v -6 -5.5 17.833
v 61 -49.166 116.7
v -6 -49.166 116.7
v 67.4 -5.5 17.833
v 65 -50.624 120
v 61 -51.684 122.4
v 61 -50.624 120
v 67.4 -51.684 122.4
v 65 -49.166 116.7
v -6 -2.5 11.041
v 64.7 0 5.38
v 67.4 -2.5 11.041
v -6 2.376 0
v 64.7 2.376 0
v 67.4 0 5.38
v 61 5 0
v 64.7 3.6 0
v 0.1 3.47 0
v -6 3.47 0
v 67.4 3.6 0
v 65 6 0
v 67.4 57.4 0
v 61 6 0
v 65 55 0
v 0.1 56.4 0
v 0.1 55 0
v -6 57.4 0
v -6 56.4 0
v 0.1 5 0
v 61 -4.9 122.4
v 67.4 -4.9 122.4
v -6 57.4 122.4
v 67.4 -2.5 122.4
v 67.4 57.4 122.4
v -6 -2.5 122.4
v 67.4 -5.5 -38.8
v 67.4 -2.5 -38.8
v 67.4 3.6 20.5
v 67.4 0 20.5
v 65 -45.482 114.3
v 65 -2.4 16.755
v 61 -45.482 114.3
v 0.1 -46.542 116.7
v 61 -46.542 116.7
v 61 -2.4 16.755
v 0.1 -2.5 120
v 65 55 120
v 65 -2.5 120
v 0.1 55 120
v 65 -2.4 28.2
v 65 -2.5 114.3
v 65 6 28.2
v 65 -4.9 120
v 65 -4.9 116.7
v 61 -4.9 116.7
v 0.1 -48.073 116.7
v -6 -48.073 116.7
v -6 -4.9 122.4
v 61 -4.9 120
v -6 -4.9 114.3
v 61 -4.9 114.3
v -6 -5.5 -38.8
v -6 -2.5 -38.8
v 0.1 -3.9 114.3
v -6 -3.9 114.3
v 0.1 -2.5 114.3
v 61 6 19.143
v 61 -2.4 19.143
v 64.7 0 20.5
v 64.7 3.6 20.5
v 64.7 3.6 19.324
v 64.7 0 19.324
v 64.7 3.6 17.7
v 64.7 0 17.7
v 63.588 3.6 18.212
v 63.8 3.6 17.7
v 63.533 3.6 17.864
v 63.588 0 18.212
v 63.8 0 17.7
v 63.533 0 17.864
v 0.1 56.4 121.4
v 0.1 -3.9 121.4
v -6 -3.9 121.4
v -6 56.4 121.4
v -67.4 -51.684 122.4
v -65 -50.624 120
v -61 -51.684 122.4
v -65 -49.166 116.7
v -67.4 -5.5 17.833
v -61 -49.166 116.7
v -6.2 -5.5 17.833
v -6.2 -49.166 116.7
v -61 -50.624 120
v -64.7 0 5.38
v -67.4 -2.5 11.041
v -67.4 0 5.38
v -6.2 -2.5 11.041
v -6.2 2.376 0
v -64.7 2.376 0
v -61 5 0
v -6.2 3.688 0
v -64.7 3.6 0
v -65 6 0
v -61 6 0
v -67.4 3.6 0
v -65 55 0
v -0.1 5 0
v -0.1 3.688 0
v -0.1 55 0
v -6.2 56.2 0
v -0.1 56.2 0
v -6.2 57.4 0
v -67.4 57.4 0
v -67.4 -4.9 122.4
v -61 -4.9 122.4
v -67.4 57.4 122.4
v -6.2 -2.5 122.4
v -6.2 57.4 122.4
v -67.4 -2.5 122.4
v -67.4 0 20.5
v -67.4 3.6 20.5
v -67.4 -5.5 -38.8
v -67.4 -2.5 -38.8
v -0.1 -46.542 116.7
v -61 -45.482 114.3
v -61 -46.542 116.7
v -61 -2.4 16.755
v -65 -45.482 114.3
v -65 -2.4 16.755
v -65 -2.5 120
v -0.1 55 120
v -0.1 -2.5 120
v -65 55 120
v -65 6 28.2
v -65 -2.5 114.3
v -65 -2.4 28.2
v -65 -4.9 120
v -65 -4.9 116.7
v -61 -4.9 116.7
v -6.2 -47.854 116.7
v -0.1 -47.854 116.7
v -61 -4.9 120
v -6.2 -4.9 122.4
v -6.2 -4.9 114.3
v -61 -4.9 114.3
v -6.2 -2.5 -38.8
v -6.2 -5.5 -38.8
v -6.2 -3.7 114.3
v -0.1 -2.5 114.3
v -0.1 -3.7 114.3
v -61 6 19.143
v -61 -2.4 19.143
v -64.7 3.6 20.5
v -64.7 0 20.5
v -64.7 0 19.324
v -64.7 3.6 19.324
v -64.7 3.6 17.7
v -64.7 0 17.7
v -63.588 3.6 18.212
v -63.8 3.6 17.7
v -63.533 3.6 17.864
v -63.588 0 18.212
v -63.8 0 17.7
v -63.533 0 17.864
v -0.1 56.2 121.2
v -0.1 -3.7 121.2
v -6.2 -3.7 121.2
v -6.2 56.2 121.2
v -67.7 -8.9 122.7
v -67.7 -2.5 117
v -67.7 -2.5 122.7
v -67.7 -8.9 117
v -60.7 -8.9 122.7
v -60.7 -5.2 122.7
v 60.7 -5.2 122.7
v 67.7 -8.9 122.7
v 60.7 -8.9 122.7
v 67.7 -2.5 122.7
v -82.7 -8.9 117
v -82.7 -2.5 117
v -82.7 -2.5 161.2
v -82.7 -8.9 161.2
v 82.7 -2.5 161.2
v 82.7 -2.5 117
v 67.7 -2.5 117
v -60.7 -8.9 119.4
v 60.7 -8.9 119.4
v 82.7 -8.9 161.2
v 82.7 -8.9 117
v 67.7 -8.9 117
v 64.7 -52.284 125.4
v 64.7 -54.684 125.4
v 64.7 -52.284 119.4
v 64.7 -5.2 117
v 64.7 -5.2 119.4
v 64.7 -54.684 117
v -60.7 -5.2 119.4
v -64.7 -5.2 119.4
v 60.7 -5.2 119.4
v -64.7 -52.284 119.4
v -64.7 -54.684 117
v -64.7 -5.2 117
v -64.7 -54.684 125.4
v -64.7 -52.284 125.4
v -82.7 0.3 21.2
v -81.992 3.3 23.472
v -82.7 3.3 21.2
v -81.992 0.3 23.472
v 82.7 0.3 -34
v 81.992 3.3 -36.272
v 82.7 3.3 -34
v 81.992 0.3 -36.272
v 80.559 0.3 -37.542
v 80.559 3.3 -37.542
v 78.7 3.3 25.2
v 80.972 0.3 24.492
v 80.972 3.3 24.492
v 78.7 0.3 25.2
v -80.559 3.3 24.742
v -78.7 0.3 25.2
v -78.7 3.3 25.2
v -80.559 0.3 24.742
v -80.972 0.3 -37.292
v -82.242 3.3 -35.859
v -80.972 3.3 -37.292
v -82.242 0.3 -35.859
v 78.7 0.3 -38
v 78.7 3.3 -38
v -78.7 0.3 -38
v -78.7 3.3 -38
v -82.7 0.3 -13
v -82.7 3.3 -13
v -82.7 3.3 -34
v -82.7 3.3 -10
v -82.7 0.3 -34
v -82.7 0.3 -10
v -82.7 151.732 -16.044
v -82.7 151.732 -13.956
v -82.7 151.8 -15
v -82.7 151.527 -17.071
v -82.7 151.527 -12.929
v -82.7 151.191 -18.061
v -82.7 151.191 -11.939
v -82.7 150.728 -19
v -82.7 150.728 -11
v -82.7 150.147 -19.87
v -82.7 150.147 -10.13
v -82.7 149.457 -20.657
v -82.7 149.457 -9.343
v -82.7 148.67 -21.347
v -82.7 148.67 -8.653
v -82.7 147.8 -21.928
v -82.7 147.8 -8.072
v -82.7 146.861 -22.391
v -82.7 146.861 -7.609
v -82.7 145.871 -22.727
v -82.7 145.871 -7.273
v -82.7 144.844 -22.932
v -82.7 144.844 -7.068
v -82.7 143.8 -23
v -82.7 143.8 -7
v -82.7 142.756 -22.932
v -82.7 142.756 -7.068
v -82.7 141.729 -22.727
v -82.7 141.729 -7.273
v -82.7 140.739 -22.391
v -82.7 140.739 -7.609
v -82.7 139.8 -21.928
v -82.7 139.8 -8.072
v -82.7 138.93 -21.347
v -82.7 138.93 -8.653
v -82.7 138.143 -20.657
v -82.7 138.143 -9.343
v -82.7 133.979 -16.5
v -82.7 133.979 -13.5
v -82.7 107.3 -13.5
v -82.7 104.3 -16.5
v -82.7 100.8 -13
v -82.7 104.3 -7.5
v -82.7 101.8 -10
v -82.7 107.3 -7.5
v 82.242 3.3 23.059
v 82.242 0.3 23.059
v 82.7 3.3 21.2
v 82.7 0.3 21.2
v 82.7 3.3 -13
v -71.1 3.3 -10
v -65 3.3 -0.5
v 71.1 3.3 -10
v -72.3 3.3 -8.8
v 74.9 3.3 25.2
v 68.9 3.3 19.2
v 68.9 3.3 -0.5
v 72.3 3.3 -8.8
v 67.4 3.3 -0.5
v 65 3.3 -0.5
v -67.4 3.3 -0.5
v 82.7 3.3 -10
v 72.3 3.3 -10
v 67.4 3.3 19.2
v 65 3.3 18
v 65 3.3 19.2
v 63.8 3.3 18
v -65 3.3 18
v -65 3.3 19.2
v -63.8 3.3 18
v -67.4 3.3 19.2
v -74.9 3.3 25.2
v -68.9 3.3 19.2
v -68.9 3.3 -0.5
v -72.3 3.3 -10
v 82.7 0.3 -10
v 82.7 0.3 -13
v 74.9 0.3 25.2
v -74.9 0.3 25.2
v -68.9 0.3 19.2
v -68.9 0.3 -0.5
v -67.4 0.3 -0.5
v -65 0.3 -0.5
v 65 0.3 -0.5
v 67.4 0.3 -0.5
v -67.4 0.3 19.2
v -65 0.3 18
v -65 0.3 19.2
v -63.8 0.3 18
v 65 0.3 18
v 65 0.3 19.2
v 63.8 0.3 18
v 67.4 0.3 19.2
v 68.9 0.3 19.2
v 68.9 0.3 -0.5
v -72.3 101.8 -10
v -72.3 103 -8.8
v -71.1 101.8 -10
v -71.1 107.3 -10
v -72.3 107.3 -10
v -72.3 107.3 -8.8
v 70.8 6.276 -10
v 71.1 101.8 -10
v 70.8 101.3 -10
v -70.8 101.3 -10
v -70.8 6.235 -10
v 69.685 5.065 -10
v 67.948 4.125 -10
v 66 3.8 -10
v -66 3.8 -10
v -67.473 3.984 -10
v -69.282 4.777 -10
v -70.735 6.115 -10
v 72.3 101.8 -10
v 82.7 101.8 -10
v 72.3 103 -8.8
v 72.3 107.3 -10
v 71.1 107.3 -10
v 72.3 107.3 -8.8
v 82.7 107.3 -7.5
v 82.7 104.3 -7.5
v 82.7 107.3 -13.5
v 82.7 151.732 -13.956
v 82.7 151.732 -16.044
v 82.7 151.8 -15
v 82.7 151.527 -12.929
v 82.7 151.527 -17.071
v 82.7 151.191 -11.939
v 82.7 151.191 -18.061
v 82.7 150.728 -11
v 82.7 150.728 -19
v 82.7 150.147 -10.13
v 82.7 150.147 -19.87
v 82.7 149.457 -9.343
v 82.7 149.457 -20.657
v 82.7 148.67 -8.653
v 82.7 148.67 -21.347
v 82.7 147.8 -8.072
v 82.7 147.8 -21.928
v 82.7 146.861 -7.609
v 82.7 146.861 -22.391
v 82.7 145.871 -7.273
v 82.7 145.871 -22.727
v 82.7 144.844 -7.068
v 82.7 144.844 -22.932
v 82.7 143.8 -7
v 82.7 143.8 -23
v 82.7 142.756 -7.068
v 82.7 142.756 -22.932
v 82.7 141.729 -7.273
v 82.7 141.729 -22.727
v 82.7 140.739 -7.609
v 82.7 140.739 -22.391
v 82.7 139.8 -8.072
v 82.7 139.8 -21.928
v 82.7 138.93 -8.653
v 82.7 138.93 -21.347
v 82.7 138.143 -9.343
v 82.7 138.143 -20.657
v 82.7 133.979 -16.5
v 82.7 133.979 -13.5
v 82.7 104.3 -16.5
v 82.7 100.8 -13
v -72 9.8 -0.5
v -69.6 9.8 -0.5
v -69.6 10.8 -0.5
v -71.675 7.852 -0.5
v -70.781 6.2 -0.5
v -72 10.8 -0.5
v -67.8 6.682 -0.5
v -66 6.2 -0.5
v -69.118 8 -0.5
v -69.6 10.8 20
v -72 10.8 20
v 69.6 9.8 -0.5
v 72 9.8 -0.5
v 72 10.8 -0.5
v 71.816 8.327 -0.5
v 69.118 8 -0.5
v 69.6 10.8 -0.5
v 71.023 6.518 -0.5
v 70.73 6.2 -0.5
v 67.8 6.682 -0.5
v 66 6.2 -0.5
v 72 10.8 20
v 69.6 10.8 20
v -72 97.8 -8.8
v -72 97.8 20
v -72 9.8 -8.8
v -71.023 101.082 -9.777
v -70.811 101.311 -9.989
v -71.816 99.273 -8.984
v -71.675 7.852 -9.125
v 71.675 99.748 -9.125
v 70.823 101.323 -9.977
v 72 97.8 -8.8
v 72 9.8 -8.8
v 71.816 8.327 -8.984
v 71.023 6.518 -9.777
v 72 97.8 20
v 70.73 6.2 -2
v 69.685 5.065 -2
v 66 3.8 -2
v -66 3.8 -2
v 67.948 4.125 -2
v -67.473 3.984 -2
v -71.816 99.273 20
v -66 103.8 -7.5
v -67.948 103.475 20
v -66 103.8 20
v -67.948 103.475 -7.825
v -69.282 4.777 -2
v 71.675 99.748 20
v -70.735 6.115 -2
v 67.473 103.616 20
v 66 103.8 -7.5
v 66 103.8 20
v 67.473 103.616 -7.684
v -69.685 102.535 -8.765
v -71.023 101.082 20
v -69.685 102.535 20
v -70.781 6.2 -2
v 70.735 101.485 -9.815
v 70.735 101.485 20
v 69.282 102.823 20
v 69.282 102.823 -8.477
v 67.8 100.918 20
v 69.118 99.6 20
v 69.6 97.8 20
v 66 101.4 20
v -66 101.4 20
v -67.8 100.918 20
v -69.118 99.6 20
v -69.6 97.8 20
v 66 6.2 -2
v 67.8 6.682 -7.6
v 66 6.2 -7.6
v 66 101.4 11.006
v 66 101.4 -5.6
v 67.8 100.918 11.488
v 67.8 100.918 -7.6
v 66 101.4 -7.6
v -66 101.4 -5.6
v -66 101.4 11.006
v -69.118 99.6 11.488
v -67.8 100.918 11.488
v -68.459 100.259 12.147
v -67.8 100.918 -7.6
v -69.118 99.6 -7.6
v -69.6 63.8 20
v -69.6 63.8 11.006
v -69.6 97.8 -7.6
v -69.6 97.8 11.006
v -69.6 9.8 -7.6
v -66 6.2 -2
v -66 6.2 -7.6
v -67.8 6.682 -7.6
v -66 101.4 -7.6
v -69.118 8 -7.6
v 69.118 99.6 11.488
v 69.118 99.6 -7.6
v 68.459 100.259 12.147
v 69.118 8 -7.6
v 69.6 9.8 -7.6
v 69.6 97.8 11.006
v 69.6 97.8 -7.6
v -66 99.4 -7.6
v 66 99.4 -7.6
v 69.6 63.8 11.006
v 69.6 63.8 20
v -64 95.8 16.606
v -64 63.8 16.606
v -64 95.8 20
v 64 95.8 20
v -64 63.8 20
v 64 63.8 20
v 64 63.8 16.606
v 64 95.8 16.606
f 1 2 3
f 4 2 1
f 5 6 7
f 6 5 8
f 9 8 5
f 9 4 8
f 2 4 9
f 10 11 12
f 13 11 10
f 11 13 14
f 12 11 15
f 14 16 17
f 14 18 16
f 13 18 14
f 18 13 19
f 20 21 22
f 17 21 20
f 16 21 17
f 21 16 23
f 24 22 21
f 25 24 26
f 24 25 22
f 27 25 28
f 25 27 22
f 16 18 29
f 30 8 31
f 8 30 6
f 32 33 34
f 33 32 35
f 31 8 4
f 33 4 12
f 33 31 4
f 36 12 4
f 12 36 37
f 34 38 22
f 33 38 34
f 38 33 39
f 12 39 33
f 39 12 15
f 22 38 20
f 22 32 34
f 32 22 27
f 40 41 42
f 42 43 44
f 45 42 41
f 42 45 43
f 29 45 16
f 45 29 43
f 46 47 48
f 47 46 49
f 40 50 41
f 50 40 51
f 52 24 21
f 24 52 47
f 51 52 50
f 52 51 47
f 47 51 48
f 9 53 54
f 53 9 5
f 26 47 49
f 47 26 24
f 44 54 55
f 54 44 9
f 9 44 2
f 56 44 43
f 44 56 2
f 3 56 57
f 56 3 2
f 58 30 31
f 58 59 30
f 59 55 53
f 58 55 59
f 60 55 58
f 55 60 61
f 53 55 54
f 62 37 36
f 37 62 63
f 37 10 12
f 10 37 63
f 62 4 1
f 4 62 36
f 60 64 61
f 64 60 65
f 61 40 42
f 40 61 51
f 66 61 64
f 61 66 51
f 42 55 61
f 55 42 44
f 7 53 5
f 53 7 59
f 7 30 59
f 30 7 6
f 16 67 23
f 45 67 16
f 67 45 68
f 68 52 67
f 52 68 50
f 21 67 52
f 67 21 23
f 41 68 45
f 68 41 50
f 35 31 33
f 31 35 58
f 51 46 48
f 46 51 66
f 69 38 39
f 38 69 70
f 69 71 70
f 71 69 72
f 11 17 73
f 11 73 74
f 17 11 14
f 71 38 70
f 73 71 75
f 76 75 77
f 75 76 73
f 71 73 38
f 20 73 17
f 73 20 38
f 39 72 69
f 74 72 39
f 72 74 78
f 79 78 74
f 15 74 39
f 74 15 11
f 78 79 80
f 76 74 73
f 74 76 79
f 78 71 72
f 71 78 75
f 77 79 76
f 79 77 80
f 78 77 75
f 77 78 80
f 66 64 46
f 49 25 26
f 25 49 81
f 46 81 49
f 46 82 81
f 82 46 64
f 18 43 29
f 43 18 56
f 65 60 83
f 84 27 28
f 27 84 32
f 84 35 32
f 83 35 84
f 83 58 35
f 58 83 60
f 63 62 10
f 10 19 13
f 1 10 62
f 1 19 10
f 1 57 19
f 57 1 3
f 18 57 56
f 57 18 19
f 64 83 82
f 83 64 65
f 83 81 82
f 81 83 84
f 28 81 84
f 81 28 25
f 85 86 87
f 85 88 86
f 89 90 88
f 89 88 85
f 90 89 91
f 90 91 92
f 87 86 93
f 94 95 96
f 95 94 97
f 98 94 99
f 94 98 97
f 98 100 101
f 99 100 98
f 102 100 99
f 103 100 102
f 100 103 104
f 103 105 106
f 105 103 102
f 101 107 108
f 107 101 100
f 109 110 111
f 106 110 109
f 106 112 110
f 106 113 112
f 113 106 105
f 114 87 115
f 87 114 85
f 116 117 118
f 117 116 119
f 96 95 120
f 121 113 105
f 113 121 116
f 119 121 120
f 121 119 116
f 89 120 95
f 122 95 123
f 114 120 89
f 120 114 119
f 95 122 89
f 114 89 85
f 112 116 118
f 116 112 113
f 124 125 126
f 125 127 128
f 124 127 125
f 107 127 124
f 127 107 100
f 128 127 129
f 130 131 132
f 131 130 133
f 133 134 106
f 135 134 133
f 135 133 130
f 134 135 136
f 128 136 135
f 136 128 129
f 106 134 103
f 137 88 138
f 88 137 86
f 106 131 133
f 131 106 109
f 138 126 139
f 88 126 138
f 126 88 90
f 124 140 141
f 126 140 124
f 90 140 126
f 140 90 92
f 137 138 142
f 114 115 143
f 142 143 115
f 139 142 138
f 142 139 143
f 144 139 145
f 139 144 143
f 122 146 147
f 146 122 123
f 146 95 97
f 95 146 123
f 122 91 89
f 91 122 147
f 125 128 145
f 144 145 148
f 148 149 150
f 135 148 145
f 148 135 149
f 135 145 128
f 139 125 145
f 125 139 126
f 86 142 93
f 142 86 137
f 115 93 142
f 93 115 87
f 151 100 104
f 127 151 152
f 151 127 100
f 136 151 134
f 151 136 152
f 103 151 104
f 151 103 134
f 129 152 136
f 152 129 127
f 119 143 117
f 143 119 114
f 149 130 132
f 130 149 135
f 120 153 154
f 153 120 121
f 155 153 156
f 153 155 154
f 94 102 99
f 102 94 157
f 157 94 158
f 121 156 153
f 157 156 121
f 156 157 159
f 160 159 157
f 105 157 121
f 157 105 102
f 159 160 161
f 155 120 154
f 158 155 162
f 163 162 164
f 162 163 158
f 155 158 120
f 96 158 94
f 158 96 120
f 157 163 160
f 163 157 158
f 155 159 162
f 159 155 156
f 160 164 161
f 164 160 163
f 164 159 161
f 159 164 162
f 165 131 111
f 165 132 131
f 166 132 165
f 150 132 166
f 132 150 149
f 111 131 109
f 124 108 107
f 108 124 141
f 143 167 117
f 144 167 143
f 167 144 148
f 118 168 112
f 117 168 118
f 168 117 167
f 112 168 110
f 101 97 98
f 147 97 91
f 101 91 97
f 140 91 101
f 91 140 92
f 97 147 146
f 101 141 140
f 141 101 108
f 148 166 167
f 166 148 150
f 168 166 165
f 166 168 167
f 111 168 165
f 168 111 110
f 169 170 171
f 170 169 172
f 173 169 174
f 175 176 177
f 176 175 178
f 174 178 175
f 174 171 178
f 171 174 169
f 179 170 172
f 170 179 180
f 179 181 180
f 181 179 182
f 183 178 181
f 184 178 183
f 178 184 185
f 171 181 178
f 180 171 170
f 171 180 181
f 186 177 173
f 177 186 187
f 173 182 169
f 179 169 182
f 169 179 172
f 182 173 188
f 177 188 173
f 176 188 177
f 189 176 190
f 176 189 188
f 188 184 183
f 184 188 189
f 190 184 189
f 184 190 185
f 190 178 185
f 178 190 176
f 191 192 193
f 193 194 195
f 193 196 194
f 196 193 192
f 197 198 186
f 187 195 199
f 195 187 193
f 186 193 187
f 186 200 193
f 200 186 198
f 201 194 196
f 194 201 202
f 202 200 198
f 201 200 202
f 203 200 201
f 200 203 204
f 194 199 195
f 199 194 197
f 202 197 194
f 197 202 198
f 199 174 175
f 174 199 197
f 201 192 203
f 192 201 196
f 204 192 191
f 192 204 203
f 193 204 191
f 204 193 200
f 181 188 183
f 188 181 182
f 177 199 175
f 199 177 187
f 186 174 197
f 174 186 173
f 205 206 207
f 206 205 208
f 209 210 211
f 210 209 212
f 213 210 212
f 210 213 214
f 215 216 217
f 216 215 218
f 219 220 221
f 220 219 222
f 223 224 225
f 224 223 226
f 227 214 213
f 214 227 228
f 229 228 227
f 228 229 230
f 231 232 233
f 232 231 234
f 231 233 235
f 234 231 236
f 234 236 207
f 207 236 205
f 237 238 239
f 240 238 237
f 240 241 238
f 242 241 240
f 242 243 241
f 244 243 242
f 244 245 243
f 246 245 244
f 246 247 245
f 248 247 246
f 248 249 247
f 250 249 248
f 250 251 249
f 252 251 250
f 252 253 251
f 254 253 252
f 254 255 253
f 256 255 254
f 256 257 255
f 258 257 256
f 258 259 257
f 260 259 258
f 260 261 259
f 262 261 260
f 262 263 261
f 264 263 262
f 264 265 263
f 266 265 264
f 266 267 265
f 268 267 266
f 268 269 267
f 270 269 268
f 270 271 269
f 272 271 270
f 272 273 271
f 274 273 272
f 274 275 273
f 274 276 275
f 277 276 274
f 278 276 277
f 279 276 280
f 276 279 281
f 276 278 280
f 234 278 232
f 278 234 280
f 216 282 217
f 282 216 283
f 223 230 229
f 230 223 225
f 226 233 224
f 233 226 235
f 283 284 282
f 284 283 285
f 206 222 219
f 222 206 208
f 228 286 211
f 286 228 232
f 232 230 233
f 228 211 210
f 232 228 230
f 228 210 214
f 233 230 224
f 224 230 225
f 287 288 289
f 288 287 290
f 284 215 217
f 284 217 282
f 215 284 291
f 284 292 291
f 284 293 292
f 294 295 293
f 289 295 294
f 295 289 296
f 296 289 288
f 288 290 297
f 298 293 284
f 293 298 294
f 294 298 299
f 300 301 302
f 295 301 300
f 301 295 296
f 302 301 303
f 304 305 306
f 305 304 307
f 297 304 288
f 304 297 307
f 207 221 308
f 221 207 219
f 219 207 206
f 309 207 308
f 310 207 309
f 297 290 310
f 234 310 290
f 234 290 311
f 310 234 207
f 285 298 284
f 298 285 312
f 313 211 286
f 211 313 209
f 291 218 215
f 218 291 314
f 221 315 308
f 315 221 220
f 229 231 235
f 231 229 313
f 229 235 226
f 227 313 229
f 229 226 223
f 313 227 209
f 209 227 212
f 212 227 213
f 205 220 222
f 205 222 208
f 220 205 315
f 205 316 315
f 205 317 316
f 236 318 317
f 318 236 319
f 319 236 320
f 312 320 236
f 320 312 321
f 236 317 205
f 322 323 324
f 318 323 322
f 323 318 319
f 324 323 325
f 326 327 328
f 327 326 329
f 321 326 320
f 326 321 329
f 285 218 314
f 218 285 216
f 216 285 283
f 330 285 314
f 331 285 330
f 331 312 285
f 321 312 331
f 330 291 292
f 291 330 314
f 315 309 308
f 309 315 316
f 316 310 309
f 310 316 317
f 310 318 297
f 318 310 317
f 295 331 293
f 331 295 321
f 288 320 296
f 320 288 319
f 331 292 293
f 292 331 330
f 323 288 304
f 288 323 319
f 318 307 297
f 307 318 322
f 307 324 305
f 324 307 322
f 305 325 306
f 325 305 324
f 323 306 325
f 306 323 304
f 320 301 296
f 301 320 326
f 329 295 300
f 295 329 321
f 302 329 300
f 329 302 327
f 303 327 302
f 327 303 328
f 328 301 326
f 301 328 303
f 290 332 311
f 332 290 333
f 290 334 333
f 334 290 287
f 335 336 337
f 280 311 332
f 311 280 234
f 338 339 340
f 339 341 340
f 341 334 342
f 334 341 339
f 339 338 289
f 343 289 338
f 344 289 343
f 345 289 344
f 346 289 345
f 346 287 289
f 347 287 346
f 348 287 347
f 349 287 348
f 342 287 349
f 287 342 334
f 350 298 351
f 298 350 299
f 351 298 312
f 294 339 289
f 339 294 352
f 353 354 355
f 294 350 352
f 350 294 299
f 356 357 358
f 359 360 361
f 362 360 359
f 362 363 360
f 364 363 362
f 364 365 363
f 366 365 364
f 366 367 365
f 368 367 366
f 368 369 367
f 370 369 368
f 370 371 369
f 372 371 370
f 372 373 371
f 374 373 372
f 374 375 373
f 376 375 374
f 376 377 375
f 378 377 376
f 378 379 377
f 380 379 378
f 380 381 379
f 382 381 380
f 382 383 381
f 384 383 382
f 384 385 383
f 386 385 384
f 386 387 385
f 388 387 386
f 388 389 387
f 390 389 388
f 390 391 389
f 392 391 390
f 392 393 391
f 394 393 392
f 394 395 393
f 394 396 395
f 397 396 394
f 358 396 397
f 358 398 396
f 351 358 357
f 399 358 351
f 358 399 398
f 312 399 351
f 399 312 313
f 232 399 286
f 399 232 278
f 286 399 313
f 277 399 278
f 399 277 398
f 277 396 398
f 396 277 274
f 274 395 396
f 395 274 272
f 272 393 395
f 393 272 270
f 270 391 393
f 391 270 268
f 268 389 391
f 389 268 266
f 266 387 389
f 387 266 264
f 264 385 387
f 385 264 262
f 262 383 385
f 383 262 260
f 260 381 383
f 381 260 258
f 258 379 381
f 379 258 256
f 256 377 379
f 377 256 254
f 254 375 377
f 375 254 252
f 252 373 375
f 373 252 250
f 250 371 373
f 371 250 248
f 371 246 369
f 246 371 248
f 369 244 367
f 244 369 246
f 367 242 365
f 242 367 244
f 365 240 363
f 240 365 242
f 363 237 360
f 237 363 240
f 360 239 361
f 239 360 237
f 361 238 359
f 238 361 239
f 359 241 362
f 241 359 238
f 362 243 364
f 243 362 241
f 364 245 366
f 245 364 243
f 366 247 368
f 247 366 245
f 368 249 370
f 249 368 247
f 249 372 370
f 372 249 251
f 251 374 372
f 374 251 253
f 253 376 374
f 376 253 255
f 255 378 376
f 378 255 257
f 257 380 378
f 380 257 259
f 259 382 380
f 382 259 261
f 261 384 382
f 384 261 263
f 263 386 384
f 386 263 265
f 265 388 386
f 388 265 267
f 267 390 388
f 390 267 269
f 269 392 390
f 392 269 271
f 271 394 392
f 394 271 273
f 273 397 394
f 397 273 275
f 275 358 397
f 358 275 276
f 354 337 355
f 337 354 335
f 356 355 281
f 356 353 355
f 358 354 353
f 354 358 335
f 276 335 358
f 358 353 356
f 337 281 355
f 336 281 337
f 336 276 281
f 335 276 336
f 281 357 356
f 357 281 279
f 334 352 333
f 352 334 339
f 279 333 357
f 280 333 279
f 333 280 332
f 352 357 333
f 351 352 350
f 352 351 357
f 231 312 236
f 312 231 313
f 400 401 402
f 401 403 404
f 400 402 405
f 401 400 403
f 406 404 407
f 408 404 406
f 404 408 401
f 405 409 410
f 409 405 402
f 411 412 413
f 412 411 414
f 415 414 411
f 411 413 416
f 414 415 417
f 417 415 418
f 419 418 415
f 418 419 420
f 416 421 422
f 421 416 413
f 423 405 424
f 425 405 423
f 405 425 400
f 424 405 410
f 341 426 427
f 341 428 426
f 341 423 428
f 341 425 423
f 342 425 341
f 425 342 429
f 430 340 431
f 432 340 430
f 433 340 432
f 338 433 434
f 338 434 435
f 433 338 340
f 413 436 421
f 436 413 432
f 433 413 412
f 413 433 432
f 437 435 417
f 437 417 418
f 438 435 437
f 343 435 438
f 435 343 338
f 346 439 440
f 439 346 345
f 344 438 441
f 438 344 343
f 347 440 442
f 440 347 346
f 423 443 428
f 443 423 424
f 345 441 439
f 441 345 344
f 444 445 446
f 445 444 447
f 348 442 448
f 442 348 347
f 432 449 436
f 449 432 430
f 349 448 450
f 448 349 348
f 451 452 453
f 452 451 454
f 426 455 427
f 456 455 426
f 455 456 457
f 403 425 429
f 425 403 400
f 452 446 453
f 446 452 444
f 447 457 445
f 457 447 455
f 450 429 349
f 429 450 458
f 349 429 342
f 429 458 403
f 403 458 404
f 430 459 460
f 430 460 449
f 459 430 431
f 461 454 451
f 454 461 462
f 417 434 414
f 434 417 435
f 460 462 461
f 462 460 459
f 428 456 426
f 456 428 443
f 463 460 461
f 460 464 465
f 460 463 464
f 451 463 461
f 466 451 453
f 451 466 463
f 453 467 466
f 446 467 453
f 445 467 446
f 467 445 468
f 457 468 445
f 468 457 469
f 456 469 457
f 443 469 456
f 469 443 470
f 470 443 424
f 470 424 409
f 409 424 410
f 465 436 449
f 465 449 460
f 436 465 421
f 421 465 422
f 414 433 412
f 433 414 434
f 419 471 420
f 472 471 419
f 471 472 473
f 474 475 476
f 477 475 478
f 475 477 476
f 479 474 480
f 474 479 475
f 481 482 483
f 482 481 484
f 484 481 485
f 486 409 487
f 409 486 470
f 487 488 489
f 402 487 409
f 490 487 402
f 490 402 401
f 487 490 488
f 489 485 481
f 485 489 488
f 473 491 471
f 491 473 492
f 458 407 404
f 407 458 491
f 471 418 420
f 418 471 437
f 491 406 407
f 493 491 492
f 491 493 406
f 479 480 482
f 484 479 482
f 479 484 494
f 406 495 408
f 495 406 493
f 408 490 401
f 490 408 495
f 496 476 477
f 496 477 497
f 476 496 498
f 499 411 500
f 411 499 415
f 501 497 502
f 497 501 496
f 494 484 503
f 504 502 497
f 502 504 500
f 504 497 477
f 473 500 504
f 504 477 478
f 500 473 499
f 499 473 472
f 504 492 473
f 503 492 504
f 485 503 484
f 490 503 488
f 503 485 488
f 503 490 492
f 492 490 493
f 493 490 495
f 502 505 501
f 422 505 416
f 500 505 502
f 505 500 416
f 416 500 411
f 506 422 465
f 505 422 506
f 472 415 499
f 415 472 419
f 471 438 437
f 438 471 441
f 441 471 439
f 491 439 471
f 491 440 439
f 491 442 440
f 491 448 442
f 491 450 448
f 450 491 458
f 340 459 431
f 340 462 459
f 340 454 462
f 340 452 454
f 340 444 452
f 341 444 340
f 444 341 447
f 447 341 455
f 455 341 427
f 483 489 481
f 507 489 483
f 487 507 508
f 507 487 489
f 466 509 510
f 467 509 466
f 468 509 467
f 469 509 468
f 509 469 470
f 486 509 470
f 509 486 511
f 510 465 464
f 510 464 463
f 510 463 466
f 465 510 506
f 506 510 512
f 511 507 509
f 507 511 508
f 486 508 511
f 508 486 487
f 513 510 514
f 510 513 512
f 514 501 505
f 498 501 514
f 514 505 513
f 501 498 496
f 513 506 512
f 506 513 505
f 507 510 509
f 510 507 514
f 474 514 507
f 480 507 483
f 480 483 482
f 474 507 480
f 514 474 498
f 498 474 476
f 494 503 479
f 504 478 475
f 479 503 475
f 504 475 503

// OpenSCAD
part = "assembly";

t        = 2.4;
W_in     = 130;
H        = 120;
y_back0  = 5;
y_backT  = -48;
y_front  = 55;
bar_d    = 2.5;
door_w   = 140;
door_h   = 170;
overlap  = 15;
clr      = 0.3;
seam_clr = 0.2;
seam_lap = 6;
lid_t    = 2.4;
plate_t  = 3;
groove_d = 2.7;
tray_w   = 144;
tray_d   = 100;
tray_h   = 30;
lip      = 8;
perch_d  = 16;
r_edge   = 4;
ch       = 1.2;

hw       = W_in/2;
x_out    = hw + t;
z_roof   = H + t;
run      = y_back0 - y_backT;
ang      = atan2(H, run);
th_y     = t/sin(ang);
z_door0  = -(door_h - z_roof)/2;
z_door1  = z_door0 + door_h;
z_fl0    = z_door0 - overlap;
y_fl0    = -bar_d - plate_t;
y_fl1    = -bar_d;
y_lip0   = y_fl1 - t;
z_lidbot = H - 3;
z_ledge  = z_lidbot - clr - t;
p_back0  = [y_back0-th_y, 0];
p_backT  = [y_backT-th_y-run*t/H, z_roof];
y_lid0   = p_backT[0] - 3;
z_fl1    = 60;
y_ledge0 = y_backT - th_y;
y_plate0 = clr;
y_plate1 = clr + plate_t;
x_win    = x_out - groove_d + clr;
x_plate  = door_w/2 + overlap - 2.3;
z_plate0 = -38;
finger_w = groove_d - clr;
slit     = 1.5;
x_slit   = x_out + slit;
catch_d  = 1.2;
catch_clr = 0.3;
z_catch  = 18;
z_finger = z_catch + catch_d;
z_groove = z_finger + catch_clr + 1;
z_rib    = z_finger + 9;
z_plate1 = z_finger + 6;
z_shelf1 = -10;
lip_h    = 2.5;
y_tray0  = y_plate1 + 0.5;
y_tray1  = y_tray0 + tray_d;
y_shelf1 = y_tray1 + 3.5;
perch_fwd = 40;
perch_drop = 35;
perch_y  = y_tray1 + perch_fwd;
perch_z  = z_shelf1 + tray_h - perch_drop;
z_arm0   = perch_z - plate_t/2;

echo(wall_angle_deg=ang, slot_width=y_front-y_back0, through_w=2*x_out, through_h=z_roof, door_z0=z_door0);

module prof_interior() polygon([[y_back0,0],[y_front,0],[y_front,H],[y_backT,H]]);
module prof_outer()    polygon([p_back0,[y_front+t,0],[y_front+t,z_roof],p_backT]);
module yz(x0,x1) translate([x0,0,0]) rotate([90,0,90]) linear_extrude(height=x1-x0) children();
module xz(y0,y1) translate([0,y1,0]) rotate([90,0,0]) linear_extrude(height=y1-y0) children();
module catch(g) offset(r=g) polygon([[x_win,z_catch],[x_win-catch_d,z_catch],[x_win,z_finger]]);

module outside_back_wall() polygon([p_back0+3*(p_back0-p_backT), p_backT-3*(p_back0-p_backT), [-300,4*z_roof], [-300,-3*z_roof]]);

module body() {
  difference() {
    union() {
      difference() {
        yz(-x_out,x_out) prof_outer();
        yz(-hw,hw) prof_interior();
        translate([-hw, y_lid0-5, z_lidbot-clr]) cube([W_in, y_lip0-y_lid0+5, 50]);
      }
      intersection() {
        translate([-x_out,y_fl0,z_fl0]) cube([2*x_out, plate_t, z_fl1-z_fl0]);
        yz(-200,200) outside_back_wall();
      }
      translate([-x_out,y_lip0,z_ledge]) cube([2*x_out, t, z_roof-z_ledge]);
      for (s=[-1,1]) mirror([s<0?1:0,0,0]) intersection() {
        union() {
          translate([hw-4,y_ledge0-3,z_ledge]) cube([4+t, y_lip0-y_ledge0+3, t]);
          translate([hw-4,y_ledge0-3,H]) cube([4+t, y_lip0-y_ledge0+3, t]);
          xz(y_plate0-clr-t, y_plate1+clr+t) polygon([[hw-4,0],[x_out,0],[x_out,z_rib],[hw,z_rib],[hw-4,z_rib-4*tan(ang)]]);
        }
        yz(0,x_out) prof_outer();
      }
    }
    for (s=[-1,1]) mirror([s<0?1:0,0,0]) {
      translate([x_out-groove_d, y_plate0-clr, -1]) cube([groove_d+1, plate_t+2*clr, z_groove+1]);
      xz(y_plate0-clr, y_plate1+clr) catch(catch_clr);
    }
  }
}

module lap(g) {
  difference() { offset(delta=1) prof_outer(); offset(delta=t/2+g) prof_interior(); }
  translate([y_lip0-1, z_ledge-1]) square([1+t/2-g, z_roof-z_ledge+2]);
  intersection() { translate([y_fl0-1, z_fl0-1]) square([plate_t+1, z_fl1-z_fl0+2]); outside_back_wall(); }
}

module body_half(tongue) intersection() {
  body();
  difference() {
    union() {
      yz(seam_clr/2, x_out+1) square(1000, center=true);
      if (tongue) yz(-seam_lap, seam_clr/2) lap(seam_clr);
    }
    if (!tongue) yz(seam_clr/2-1, seam_lap+seam_clr) lap(0);
  }
}

module body_R() body_half(true);
module body_L() mirror([1,0,0]) body_half(false);

module lid() {
  z_hb1 = z_door1 + overlap;
  lid_len = y_lip0 - clr - y_lid0;
  translate([-hw+clr, y_lid0, z_lidbot]) cube([W_in-2*clr, lid_len, lid_t]);
  translate([-hw+clr, y_lid0, z_lidbot]) cube([W_in-2*clr, t, lid_t+6]);
  translate([-x_plate, y_lip0-4, z_roof+clr]) cube([2*x_plate, 4+t, z_hb1-z_roof-clr]);
  translate([-hw+4+clr, y_lip0-4, z_lidbot]) cube([W_in-8-2*clr, 4-clr, z_roof+clr-z_lidbot]);
  for (s=[-1,1]) translate([s>0 ? x_out+clr : -x_plate, y_lip0-4, z_lidbot]) cube([x_plate-x_out-clr, 4+t, z_roof+clr-z_lidbot]);
}

module rounded_plate(w, h, r) offset(r=r) offset(delta=-r) square([w,h]);

module bracket() {
  difference() {
    translate([-x_plate, y_plate1, z_plate0]) rotate([90,0,0]) linear_extrude(height=plate_t) rounded_plate(2*x_plate, z_plate1-z_plate0, r_edge);
    xz(y_plate0-1, y_plate1+1)
      polygon([[-x_slit,-0.5],[x_slit,-0.5],[x_slit,z_finger],[x_slit+100,z_finger+100],[-x_slit-100,z_finger+100],[-x_slit,z_finger]]);
  }
  for (s=[-1,1]) mirror([s<0?1:0,0,0]) xz(y_plate0, y_plate1) {
    translate([x_win,-1]) square([finger_w, z_finger+1]);
    catch(0);
  }
  yz(-x_plate, x_plate) {
    translate([y_plate0, z_shelf1-plate_t]) square([y_shelf1-y_plate0, plate_t]);
    polygon([[y_shelf1-plate_t-(z_shelf1-plate_t-z_arm0), z_shelf1-plate_t],[y_shelf1, z_shelf1-plate_t],[y_shelf1, z_arm0],[y_shelf1-plate_t, z_arm0]]);
    polygon([[y_shelf1-plate_t-lip_h, z_shelf1],[y_shelf1, z_shelf1],[y_shelf1, z_shelf1+lip_h],[y_shelf1-plate_t, z_shelf1+lip_h]]);
    translate([y_shelf1-plate_t, z_arm0]) square([perch_y-y_shelf1+plate_t, plate_t]);
    hull() { translate([perch_y, perch_z]) circle(d=perch_d, $fn=48); translate([perch_y-perch_d/sqrt(2), perch_z]) circle(0.01, $fn=4); }
  }
  for (s=[-1,1]) translate([s*(tray_w/2-ch+clr), y_plate0, z_shelf1]) rotate([-90,0,0]) linear_extrude(height=y_shelf1-y_plate0)
    polygon([[0,0],[s*ch,0],[s*ch,-ch]]);
}

module tray() {
  fl = 2.4; z0 = z_shelf1;
  yl = y_tray0 + 60;
  difference() {
    translate([-tray_w/2, y_tray0, z0]) linear_extrude(height=tray_h) rounded_plate(tray_w, tray_d, 6);
    translate([-tray_w/2+t, y_tray0+t, z0+fl]) linear_extrude(height=tray_h) rounded_plate(tray_w-2*t, tray_d-2*t, 6-t);
    translate([-tray_w/2-1, y_tray0-1, z0+8]) cube([tray_w+2, t+1, tray_h]);
    for (s=[-1,1]) translate([s>0 ? 64.5 : -tray_w/2-1, y_tray0-1, -0.5]) cube([tray_w/2+1-64.5, 8, tray_h]);
    for (s=[-1,1]) translate([s*tray_w/2, y_tray0-1, 0]) rotate([-90,0,0]) linear_extrude(height=tray_d+2)
      polygon([[0,-z0+1],[-s*(ch+1),-z0+1],[0,-z0-ch]]);
    yz(-tray_w/2-1, tray_w/2+1) polygon([[y_tray1-lip_h-1, z0-1],[y_tray1+1, z0-1],[y_tray1+1, z0+lip_h+1]]);
  }
  yz(-tray_w/2+6, tray_w/2-6) polygon([[y_tray1-t+1, z0+fl-1],[y_tray1-t-2, z0+fl-1],[y_tray1-t-2, z0+fl],[y_tray1-t+1, z0+fl+3]]);
  intersection() {
    translate([-tray_w/2, y_tray0, z0]) linear_extrude(height=tray_h) rounded_plate(tray_w, tray_d, 6);
    union() {
      translate([0, y_tray0+tray_d, z0+tray_h-lip-t*sqrt(2)]) yz(-tray_w/2, tray_w/2) polygon([[0,0],[-lip,lip],[-lip,lip+t*sqrt(2)],[0,lip+t*sqrt(2)]]);
      for (s=[-1,1]) translate([s*tray_w/2, yl, z0+tray_h-lip-t*sqrt(2)]) rotate([90,0,0]) mirror([0,0,1]) linear_extrude(height=tray_d-60)
        polygon([[0,0],[-s*lip,lip],[-s*lip,lip+t*sqrt(2)],[0,lip+t*sqrt(2)]]);
    }
  }
}

module clip(box) if (is_undef(box)) children(); else render() intersection() { children(); translate(box[0]) cube(box[1]); }

module assembly(box=undef) {
  color("SteelBlue") clip(box) body_R();
  color("SteelBlue") clip(box) body_L();
  color("Orange") clip(box) lid();
  color("SeaGreen") clip(box) bracket();
  color("Gold") clip(box) tray();
}

module conure() color("Gray", 0.5) yz(-3,3) {
  translate([perch_y-10, perch_z+8+40]) scale([22,30]) circle(1, $fn=64);
  translate([perch_y-28, perch_z+8+84]) circle(16, $fn=48);
  polygon([[perch_y+4,perch_z+35],[perch_y+14,perch_z+38],[perch_y+48,perch_z-40],[perch_y+38,perch_z-43]]);
}

if (part=="body_R") body_R();
if (part=="body_L") body_L();
if (part=="lid") lid();
if (part=="bracket") bracket();
if (part=="tray") tray();
if (part=="assembly") assembly();
if (part=="seam") intersection() { union() { translate([5,0,0]) body_R(); translate([-5,0,0]) body_L(); } translate([-25,-200,50]) cube([50,400,10]); }
if (part=="section") assembly([[-400,-200,-200],[400,400,400]]);
if (part=="perch") { assembly([[-400,-200,-200],[400,400,400]]); conure(); }
if (part=="catch") assembly([[50,1.5,-8],[30,0.6,35]]);
